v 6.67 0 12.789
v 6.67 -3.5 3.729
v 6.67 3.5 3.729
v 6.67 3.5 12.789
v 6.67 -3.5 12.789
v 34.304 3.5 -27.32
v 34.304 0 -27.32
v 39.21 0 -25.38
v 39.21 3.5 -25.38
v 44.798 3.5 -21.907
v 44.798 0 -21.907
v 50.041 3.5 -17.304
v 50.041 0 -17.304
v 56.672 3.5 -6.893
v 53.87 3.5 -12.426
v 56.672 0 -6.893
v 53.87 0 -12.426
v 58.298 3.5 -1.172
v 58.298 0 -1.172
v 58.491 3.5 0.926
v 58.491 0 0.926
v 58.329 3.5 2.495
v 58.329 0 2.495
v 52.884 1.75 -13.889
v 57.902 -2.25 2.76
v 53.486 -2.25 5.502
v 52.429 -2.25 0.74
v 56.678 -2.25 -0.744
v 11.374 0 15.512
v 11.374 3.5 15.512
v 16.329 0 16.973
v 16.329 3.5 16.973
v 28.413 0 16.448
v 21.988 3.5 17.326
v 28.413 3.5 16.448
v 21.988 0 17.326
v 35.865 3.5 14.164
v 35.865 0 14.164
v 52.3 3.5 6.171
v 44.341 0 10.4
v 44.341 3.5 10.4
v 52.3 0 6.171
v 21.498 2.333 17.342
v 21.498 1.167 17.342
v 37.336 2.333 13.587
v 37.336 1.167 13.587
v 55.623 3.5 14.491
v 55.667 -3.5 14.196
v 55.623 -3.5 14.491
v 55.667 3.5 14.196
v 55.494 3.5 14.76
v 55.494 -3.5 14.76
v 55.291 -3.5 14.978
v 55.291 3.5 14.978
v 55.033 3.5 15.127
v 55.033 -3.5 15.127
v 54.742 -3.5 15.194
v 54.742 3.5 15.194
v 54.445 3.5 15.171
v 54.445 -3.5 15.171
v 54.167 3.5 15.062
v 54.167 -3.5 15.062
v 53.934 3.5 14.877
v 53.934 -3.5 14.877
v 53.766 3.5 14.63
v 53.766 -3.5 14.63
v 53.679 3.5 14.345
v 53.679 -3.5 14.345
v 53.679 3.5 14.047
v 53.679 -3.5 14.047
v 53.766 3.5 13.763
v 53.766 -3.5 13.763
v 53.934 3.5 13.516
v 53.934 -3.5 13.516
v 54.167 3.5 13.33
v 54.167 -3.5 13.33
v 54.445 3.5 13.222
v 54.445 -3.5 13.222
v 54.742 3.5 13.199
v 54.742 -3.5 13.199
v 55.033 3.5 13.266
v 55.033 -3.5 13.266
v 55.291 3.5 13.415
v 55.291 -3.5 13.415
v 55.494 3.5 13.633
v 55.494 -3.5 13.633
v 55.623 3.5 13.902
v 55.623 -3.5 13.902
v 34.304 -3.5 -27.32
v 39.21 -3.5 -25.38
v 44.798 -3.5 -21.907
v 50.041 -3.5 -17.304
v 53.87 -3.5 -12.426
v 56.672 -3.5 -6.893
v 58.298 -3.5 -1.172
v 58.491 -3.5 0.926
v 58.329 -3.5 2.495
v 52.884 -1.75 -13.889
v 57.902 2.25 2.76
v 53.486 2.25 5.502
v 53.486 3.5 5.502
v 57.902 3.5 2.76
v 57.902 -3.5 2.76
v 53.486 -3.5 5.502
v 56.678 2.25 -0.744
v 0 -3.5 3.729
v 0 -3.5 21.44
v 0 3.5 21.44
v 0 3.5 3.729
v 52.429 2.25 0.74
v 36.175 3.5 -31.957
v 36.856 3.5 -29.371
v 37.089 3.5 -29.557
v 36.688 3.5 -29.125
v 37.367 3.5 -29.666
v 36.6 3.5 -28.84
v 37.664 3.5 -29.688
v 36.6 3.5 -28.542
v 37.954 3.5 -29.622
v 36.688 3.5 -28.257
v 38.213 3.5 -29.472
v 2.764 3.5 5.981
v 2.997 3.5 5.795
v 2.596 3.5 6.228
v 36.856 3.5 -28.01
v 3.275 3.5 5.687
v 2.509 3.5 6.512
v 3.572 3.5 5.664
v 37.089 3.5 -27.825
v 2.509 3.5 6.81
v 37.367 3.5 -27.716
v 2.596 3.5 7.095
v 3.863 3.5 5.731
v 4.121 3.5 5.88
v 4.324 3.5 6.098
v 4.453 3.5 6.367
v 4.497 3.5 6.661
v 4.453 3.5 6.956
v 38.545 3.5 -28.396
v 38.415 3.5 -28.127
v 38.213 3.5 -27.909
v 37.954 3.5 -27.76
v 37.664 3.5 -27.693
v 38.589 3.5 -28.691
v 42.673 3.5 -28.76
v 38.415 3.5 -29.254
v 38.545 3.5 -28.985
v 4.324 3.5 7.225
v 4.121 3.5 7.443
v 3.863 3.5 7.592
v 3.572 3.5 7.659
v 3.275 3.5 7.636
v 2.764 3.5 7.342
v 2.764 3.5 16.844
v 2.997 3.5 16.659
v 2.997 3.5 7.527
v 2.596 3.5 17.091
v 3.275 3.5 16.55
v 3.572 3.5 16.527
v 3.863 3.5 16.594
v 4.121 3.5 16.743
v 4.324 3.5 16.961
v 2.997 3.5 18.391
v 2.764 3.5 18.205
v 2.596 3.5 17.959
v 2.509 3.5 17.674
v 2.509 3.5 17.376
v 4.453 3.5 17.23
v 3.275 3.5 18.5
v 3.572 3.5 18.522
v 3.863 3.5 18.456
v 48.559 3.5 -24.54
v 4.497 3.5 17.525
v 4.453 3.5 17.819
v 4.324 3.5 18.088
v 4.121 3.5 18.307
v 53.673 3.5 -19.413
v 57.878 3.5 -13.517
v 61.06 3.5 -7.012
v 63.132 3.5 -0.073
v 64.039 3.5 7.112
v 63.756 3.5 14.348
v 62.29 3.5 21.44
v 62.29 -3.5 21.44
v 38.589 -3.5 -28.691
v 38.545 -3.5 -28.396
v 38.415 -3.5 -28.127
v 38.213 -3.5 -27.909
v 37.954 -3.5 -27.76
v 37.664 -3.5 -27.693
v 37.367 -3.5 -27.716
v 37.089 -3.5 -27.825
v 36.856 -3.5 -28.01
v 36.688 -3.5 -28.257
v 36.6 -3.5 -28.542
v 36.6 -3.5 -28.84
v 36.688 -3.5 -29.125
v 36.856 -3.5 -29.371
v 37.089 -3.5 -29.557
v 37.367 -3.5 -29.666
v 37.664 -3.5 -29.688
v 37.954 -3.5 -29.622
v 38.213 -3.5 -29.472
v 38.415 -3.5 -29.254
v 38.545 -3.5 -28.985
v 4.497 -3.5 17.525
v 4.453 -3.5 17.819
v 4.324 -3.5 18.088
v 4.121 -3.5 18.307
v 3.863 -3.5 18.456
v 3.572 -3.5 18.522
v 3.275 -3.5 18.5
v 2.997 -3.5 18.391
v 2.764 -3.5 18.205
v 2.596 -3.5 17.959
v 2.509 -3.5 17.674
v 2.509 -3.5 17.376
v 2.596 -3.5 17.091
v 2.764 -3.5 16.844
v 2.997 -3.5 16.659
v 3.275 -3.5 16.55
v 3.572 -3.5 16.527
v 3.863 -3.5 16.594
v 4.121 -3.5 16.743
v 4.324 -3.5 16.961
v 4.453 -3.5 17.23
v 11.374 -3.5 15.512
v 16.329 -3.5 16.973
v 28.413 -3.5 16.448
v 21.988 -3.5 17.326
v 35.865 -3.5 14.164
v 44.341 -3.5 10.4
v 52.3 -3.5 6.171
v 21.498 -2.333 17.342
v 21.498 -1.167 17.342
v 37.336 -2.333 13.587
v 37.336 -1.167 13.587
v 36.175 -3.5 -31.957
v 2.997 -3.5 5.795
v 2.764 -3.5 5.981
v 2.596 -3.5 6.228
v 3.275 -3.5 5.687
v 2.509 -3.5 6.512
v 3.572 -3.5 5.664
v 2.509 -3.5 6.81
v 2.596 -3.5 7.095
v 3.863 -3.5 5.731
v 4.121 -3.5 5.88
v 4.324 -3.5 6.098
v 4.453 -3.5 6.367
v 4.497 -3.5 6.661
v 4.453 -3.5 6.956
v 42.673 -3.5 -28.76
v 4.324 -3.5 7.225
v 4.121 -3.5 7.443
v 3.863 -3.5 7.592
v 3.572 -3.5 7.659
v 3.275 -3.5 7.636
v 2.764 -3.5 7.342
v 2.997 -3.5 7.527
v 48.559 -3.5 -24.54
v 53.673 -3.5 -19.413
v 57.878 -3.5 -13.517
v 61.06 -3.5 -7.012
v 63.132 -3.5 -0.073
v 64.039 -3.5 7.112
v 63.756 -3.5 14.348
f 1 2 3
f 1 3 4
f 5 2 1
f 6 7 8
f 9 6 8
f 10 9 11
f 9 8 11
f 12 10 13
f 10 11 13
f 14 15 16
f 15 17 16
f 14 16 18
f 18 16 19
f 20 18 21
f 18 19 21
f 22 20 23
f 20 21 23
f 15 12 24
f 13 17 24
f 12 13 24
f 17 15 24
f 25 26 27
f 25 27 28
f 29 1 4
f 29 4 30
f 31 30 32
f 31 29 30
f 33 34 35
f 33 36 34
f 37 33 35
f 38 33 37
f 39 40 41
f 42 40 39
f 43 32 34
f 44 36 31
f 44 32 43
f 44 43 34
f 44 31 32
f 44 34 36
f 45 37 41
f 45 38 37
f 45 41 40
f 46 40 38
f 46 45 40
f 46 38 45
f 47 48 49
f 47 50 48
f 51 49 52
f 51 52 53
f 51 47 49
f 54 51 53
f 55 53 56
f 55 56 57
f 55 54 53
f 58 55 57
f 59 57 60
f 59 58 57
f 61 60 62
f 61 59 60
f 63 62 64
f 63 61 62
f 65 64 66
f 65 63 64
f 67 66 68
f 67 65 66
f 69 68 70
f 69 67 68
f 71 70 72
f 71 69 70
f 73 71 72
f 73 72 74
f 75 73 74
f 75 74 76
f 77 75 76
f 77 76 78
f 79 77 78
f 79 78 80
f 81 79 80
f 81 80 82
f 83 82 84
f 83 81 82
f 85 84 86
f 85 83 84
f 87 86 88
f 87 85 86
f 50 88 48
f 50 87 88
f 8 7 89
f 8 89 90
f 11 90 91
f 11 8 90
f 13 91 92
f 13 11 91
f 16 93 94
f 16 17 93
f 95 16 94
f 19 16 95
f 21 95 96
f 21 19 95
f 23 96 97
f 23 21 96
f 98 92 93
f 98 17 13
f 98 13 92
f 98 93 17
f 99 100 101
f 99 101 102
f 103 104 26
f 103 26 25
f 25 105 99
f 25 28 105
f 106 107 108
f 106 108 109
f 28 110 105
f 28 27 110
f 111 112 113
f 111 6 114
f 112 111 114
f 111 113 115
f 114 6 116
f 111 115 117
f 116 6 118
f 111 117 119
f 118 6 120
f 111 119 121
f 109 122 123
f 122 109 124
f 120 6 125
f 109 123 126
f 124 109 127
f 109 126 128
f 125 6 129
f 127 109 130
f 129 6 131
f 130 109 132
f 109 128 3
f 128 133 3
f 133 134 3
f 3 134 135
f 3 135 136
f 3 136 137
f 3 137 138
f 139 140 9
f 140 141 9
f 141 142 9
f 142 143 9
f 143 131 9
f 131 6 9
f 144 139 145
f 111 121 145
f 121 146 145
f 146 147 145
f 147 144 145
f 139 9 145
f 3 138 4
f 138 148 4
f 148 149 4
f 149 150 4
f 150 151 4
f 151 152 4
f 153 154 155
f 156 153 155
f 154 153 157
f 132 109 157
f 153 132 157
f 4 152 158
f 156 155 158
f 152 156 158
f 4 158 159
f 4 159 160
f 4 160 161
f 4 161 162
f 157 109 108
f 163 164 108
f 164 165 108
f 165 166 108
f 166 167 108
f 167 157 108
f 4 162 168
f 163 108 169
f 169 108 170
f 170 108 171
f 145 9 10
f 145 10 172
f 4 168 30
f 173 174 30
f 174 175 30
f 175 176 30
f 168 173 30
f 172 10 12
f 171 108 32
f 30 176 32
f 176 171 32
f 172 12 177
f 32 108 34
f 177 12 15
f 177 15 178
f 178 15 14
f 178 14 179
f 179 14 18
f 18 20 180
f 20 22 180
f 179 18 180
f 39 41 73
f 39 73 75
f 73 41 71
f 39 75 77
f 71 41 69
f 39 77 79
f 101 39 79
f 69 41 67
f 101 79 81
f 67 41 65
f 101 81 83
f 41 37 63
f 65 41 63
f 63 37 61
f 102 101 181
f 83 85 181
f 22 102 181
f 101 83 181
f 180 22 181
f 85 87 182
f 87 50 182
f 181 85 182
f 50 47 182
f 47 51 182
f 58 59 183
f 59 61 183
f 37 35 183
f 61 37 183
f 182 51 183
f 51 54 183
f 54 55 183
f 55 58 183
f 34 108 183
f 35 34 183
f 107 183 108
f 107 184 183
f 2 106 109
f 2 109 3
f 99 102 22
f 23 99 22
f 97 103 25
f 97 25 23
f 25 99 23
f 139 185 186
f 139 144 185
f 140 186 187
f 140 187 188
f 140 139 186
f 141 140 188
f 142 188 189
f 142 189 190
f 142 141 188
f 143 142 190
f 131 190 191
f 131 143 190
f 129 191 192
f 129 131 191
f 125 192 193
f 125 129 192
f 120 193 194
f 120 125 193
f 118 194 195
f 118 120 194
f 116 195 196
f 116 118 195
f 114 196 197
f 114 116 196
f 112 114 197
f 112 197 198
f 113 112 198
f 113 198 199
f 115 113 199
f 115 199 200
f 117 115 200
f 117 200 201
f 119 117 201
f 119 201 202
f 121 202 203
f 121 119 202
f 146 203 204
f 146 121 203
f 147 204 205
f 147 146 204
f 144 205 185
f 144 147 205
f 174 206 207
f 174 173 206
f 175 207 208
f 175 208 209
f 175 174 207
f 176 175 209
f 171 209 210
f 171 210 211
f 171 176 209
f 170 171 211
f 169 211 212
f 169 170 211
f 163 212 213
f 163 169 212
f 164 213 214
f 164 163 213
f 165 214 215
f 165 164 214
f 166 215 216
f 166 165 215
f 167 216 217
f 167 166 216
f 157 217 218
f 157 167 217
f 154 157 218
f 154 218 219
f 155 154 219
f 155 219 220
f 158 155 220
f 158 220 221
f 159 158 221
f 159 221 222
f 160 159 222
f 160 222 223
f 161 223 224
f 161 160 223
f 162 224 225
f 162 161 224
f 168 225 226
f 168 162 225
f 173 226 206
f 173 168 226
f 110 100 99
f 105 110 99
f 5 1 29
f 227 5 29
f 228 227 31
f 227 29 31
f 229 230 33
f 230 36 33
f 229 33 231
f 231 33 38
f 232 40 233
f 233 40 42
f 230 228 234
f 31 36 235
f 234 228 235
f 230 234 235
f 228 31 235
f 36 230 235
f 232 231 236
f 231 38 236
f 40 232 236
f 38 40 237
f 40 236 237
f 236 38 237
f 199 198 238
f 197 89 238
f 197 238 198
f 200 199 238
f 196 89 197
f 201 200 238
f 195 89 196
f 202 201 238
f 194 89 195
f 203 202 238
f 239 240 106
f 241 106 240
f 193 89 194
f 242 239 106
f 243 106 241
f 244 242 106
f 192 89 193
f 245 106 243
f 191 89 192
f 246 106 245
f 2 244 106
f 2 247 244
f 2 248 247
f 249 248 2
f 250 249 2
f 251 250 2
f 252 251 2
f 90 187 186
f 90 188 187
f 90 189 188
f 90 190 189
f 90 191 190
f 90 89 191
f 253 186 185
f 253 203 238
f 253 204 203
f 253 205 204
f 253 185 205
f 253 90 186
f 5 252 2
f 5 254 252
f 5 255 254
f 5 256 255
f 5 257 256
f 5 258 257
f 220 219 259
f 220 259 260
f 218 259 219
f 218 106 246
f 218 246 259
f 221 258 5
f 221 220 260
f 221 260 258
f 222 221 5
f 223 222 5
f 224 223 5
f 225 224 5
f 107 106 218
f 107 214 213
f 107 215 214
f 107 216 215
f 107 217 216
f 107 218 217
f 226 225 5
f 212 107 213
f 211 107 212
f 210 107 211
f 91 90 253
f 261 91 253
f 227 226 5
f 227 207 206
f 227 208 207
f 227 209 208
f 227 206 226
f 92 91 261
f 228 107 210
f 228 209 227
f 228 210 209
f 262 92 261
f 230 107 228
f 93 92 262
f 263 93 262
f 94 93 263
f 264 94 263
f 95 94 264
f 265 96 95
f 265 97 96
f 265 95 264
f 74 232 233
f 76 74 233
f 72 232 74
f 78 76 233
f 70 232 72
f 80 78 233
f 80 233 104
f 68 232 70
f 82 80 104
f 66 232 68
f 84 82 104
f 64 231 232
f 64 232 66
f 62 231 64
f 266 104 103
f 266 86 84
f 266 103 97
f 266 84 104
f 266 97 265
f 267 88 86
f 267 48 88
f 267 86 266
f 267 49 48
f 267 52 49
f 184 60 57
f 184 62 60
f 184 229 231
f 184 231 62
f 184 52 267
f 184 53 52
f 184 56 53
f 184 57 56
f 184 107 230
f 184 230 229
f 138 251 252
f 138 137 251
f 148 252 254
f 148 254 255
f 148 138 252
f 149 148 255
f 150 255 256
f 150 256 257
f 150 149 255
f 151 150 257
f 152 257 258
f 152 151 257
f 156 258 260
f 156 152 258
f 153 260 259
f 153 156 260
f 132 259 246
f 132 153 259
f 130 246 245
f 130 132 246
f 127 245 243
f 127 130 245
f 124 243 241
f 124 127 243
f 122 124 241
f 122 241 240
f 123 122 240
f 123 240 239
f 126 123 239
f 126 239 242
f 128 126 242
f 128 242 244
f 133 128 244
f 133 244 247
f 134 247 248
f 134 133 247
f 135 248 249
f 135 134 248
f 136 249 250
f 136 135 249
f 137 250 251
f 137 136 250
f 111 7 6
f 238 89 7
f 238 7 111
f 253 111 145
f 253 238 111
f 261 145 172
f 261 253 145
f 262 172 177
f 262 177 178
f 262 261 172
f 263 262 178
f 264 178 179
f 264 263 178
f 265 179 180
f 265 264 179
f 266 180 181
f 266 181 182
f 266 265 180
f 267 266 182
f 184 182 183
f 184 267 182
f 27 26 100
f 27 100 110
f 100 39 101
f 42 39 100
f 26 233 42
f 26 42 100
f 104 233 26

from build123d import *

# Parameters (mm, degrees)
F0_R     = 1
F1_DEPTH = 3.5
F2_DEPTH = 2.25


# Not quite as in the source:
# - a feature names something its author has since deleted; it is built from what else it names


with BuildPart() as f1:
    # F0 (on Front) → F1 (new body, symmetric)
    with BuildSketch(Plane.XZ):
        with BuildLine():
            Line((62.29, 21.44), (0, 21.44))
            Line((0, 21.44), (0, 3.7288318854))
            Line((0, 3.7288318854), (6.67, 3.7288318854))
            Line((6.67, 3.7288318854), (6.67, 12.7888318854))
            add(Edge.make_bspline(
                [(6.67, 12.7888318854), (20.3660801053, 23.045424372), (38.400747317, 13.8677307047), (52.300490874, 6.170732399)],
                knots=[0, 0, 0, 0, 46.1079270648, 46.1079270648, 46.1079270648, 46.1079270648], degree=3))
            Line((52.300490874, 6.170732399), (53.4860821652, 5.5017437759))
            Line((53.4860821652, 5.5017437759), (57.9021407774, 2.7602773683))
            Line((57.9021407774, 2.7602773683), (58.3288028571, 2.49540775))
            add(Edge.make_bspline(
                [(34.304166128, -27.3203667793), (39.4049563141, -26.0173317216), (55.1670315062, -16.4703750294), (59.0722335282, -0.2752133185), (58.3288028571, 2.49540775)],
                knots=[0, 0, 0, 0, 0.5353864124, 1, 1, 1, 1], degree=3))
            Line((34.304166128, -27.3203667793), (36.1752310606, -31.9570807038))
            ThreePointArc((36.1752310606, -31.9570807038), (59.6028549739, -10.3302859108), (62.29, 21.44))
        make_face()
        with Locations((37.5891347185, -28.6906498222)):
            Circle(F0_R, mode=Mode.SUBTRACT)
        with Locations((3.4974589944, 6.6614318639)):
            Circle(F0_R, mode=Mode.SUBTRACT)
        with Locations((3.4974589944, 17.5246726722)):
            Circle(F0_R, mode=Mode.SUBTRACT)
        with Locations((54.66741696, 14.1964312643)):
            Circle(F0_R, mode=Mode.SUBTRACT)
    extrude(amount=F1_DEPTH, both=True)

    # F0 (on Front) → F2 (join, symmetric)
    with BuildSketch(Plane.XZ):
        Polygon((56.6776084413, -0.7441981102), (57.9021407774, 2.7602773683), (53.4860821652, 5.5017437759), (52.4294775853, 0.7401819728), align=None)
    extrude(amount=F2_DEPTH, both=True)


solid = f1.part
